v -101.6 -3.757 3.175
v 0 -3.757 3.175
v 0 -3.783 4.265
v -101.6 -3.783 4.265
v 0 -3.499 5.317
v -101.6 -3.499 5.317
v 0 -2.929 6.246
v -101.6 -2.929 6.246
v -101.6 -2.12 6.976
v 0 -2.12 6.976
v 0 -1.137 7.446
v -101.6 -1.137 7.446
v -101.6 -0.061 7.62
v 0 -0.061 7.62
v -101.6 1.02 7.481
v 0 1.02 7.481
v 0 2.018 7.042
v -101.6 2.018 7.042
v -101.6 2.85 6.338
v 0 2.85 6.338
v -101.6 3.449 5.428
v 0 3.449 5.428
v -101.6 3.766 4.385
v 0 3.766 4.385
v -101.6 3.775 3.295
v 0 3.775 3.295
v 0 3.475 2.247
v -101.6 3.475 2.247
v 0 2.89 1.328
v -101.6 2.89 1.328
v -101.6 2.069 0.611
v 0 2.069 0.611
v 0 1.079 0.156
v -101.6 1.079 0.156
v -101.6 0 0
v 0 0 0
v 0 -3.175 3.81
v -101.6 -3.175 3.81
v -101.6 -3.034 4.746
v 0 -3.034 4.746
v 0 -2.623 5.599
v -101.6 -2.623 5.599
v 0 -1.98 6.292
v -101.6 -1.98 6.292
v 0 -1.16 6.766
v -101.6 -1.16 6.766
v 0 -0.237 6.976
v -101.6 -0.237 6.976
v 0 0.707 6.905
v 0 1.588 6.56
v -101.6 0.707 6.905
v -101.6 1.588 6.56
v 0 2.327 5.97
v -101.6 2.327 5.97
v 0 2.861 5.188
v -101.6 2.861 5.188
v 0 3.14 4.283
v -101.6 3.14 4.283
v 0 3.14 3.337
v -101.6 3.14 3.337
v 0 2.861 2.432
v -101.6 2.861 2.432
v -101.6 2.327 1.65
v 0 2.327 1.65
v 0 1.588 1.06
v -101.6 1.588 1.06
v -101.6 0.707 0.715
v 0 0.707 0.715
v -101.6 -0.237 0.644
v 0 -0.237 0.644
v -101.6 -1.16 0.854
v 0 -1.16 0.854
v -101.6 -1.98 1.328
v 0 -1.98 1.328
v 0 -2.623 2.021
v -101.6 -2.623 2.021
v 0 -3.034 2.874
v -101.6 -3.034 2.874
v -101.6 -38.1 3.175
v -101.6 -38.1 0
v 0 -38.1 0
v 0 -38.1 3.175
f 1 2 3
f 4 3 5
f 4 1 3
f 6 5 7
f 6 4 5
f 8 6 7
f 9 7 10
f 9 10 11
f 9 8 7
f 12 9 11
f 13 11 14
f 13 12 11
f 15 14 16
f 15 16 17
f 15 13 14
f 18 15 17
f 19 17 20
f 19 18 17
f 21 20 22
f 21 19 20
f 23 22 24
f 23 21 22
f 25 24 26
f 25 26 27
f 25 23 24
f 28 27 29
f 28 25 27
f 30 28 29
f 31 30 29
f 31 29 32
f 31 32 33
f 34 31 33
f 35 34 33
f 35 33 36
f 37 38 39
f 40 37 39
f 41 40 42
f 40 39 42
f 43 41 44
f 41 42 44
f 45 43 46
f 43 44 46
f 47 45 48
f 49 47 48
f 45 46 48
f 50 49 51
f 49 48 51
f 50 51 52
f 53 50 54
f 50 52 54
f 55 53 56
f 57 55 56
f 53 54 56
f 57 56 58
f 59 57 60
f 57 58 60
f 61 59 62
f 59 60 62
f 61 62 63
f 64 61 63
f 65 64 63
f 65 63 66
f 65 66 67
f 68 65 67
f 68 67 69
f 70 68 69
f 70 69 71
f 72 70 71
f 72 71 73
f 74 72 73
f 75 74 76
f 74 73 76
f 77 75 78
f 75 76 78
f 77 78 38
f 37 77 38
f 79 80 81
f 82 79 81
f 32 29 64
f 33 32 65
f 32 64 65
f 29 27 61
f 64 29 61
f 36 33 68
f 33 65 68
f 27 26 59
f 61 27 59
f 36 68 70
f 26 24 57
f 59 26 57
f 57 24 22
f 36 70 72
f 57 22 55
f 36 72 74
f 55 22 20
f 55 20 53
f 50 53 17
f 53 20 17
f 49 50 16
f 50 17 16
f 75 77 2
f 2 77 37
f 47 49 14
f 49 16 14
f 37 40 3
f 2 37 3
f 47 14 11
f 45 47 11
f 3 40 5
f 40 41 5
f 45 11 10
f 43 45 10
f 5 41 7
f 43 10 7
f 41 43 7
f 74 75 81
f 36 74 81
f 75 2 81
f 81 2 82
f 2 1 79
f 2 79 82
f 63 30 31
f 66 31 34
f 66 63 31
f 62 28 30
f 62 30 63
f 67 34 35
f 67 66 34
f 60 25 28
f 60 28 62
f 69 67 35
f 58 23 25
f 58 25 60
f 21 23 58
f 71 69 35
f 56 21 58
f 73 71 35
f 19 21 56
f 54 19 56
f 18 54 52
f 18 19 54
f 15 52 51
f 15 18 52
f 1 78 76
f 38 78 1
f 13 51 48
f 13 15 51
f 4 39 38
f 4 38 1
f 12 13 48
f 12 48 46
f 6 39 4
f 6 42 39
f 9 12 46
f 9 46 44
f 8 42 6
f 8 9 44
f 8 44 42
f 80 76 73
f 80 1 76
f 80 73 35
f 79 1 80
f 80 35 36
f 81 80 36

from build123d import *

# Parameters (mm, degrees)
F0_W     = 101.6
F0_H     = 38.1
F1_DEPTH = 3.175
F3_DEPTH = 254
F2_R     = 3.81
F2_R_2   = 3.175
F4_DEPTH = 101.6


with BuildPart() as f1:
    # F0 (on Top) → F1 (new body)
    with BuildSketch(Plane.XY):
        with Locations((-50.8, -19.05)):
            Rectangle(F0_W, F0_H)
    extrude(amount=F1_DEPTH)

    # F2 (on face) → F3 (cut)
    with BuildSketch(Plane(origin=(-101.6, 0, 0), x_dir=(0, -1, 0), z_dir=(-1, 0, 0))):
        with BuildLine():
            ThreePointArc((3.7567106623, 3.175), (3.7966542918, 3.4913839483), (3.81, 3.81))
            ThreePointArc((3.81, 3.81), (-2.6940768363, 6.5040768363), (0, 0))
            Line((0, 0), (0, 0.635))
            ThreePointArc((0, 0.635), (-2.2450640303, 6.0550640303), (3.175, 3.81))
            ThreePointArc((3.175, 3.81), (3.1589222858, 3.4908840456), (3.1108519733, 3.175))
            Line((3.1108519733, 3.175), (3.7567106623, 3.175))
        make_face()
        with BuildLine():
            Line((0, 0.635), (0, 0))
            ThreePointArc((0, 0), (2.4593444248, 0.9000644337), (3.7567106623, 3.175))
            Line((3.7567106623, 3.175), (3.1108519733, 3.175))
            ThreePointArc((3.1108519733, 3.175), (2.0080463142, 1.3506555752), (0, 0.635))
        make_face()
        with BuildLine():
            Line((0, 3.175), (0, 0.635))
            ThreePointArc((0, 0.635), (2.0080463142, 1.3506555752), (3.1108519733, 3.175))
            Line((3.1108519733, 3.175), (0, 3.175))
        make_face()
    extrude(amount=-F3_DEPTH, mode=Mode.SUBTRACT)

    # F2 (on face) → F4 (join, through all)
    with BuildSketch(Plane(origin=(-101.6, 0, 0), x_dir=(0, -1, 0), z_dir=(-1, 0, 0))):
        with Locations((0, 3.81)):
            Circle(F2_R)
        with Locations((0, 3.81)):
            Circle(F2_R_2, mode=Mode.SUBTRACT)
    extrude(amount=-F4_DEPTH)


solid = f1.part
